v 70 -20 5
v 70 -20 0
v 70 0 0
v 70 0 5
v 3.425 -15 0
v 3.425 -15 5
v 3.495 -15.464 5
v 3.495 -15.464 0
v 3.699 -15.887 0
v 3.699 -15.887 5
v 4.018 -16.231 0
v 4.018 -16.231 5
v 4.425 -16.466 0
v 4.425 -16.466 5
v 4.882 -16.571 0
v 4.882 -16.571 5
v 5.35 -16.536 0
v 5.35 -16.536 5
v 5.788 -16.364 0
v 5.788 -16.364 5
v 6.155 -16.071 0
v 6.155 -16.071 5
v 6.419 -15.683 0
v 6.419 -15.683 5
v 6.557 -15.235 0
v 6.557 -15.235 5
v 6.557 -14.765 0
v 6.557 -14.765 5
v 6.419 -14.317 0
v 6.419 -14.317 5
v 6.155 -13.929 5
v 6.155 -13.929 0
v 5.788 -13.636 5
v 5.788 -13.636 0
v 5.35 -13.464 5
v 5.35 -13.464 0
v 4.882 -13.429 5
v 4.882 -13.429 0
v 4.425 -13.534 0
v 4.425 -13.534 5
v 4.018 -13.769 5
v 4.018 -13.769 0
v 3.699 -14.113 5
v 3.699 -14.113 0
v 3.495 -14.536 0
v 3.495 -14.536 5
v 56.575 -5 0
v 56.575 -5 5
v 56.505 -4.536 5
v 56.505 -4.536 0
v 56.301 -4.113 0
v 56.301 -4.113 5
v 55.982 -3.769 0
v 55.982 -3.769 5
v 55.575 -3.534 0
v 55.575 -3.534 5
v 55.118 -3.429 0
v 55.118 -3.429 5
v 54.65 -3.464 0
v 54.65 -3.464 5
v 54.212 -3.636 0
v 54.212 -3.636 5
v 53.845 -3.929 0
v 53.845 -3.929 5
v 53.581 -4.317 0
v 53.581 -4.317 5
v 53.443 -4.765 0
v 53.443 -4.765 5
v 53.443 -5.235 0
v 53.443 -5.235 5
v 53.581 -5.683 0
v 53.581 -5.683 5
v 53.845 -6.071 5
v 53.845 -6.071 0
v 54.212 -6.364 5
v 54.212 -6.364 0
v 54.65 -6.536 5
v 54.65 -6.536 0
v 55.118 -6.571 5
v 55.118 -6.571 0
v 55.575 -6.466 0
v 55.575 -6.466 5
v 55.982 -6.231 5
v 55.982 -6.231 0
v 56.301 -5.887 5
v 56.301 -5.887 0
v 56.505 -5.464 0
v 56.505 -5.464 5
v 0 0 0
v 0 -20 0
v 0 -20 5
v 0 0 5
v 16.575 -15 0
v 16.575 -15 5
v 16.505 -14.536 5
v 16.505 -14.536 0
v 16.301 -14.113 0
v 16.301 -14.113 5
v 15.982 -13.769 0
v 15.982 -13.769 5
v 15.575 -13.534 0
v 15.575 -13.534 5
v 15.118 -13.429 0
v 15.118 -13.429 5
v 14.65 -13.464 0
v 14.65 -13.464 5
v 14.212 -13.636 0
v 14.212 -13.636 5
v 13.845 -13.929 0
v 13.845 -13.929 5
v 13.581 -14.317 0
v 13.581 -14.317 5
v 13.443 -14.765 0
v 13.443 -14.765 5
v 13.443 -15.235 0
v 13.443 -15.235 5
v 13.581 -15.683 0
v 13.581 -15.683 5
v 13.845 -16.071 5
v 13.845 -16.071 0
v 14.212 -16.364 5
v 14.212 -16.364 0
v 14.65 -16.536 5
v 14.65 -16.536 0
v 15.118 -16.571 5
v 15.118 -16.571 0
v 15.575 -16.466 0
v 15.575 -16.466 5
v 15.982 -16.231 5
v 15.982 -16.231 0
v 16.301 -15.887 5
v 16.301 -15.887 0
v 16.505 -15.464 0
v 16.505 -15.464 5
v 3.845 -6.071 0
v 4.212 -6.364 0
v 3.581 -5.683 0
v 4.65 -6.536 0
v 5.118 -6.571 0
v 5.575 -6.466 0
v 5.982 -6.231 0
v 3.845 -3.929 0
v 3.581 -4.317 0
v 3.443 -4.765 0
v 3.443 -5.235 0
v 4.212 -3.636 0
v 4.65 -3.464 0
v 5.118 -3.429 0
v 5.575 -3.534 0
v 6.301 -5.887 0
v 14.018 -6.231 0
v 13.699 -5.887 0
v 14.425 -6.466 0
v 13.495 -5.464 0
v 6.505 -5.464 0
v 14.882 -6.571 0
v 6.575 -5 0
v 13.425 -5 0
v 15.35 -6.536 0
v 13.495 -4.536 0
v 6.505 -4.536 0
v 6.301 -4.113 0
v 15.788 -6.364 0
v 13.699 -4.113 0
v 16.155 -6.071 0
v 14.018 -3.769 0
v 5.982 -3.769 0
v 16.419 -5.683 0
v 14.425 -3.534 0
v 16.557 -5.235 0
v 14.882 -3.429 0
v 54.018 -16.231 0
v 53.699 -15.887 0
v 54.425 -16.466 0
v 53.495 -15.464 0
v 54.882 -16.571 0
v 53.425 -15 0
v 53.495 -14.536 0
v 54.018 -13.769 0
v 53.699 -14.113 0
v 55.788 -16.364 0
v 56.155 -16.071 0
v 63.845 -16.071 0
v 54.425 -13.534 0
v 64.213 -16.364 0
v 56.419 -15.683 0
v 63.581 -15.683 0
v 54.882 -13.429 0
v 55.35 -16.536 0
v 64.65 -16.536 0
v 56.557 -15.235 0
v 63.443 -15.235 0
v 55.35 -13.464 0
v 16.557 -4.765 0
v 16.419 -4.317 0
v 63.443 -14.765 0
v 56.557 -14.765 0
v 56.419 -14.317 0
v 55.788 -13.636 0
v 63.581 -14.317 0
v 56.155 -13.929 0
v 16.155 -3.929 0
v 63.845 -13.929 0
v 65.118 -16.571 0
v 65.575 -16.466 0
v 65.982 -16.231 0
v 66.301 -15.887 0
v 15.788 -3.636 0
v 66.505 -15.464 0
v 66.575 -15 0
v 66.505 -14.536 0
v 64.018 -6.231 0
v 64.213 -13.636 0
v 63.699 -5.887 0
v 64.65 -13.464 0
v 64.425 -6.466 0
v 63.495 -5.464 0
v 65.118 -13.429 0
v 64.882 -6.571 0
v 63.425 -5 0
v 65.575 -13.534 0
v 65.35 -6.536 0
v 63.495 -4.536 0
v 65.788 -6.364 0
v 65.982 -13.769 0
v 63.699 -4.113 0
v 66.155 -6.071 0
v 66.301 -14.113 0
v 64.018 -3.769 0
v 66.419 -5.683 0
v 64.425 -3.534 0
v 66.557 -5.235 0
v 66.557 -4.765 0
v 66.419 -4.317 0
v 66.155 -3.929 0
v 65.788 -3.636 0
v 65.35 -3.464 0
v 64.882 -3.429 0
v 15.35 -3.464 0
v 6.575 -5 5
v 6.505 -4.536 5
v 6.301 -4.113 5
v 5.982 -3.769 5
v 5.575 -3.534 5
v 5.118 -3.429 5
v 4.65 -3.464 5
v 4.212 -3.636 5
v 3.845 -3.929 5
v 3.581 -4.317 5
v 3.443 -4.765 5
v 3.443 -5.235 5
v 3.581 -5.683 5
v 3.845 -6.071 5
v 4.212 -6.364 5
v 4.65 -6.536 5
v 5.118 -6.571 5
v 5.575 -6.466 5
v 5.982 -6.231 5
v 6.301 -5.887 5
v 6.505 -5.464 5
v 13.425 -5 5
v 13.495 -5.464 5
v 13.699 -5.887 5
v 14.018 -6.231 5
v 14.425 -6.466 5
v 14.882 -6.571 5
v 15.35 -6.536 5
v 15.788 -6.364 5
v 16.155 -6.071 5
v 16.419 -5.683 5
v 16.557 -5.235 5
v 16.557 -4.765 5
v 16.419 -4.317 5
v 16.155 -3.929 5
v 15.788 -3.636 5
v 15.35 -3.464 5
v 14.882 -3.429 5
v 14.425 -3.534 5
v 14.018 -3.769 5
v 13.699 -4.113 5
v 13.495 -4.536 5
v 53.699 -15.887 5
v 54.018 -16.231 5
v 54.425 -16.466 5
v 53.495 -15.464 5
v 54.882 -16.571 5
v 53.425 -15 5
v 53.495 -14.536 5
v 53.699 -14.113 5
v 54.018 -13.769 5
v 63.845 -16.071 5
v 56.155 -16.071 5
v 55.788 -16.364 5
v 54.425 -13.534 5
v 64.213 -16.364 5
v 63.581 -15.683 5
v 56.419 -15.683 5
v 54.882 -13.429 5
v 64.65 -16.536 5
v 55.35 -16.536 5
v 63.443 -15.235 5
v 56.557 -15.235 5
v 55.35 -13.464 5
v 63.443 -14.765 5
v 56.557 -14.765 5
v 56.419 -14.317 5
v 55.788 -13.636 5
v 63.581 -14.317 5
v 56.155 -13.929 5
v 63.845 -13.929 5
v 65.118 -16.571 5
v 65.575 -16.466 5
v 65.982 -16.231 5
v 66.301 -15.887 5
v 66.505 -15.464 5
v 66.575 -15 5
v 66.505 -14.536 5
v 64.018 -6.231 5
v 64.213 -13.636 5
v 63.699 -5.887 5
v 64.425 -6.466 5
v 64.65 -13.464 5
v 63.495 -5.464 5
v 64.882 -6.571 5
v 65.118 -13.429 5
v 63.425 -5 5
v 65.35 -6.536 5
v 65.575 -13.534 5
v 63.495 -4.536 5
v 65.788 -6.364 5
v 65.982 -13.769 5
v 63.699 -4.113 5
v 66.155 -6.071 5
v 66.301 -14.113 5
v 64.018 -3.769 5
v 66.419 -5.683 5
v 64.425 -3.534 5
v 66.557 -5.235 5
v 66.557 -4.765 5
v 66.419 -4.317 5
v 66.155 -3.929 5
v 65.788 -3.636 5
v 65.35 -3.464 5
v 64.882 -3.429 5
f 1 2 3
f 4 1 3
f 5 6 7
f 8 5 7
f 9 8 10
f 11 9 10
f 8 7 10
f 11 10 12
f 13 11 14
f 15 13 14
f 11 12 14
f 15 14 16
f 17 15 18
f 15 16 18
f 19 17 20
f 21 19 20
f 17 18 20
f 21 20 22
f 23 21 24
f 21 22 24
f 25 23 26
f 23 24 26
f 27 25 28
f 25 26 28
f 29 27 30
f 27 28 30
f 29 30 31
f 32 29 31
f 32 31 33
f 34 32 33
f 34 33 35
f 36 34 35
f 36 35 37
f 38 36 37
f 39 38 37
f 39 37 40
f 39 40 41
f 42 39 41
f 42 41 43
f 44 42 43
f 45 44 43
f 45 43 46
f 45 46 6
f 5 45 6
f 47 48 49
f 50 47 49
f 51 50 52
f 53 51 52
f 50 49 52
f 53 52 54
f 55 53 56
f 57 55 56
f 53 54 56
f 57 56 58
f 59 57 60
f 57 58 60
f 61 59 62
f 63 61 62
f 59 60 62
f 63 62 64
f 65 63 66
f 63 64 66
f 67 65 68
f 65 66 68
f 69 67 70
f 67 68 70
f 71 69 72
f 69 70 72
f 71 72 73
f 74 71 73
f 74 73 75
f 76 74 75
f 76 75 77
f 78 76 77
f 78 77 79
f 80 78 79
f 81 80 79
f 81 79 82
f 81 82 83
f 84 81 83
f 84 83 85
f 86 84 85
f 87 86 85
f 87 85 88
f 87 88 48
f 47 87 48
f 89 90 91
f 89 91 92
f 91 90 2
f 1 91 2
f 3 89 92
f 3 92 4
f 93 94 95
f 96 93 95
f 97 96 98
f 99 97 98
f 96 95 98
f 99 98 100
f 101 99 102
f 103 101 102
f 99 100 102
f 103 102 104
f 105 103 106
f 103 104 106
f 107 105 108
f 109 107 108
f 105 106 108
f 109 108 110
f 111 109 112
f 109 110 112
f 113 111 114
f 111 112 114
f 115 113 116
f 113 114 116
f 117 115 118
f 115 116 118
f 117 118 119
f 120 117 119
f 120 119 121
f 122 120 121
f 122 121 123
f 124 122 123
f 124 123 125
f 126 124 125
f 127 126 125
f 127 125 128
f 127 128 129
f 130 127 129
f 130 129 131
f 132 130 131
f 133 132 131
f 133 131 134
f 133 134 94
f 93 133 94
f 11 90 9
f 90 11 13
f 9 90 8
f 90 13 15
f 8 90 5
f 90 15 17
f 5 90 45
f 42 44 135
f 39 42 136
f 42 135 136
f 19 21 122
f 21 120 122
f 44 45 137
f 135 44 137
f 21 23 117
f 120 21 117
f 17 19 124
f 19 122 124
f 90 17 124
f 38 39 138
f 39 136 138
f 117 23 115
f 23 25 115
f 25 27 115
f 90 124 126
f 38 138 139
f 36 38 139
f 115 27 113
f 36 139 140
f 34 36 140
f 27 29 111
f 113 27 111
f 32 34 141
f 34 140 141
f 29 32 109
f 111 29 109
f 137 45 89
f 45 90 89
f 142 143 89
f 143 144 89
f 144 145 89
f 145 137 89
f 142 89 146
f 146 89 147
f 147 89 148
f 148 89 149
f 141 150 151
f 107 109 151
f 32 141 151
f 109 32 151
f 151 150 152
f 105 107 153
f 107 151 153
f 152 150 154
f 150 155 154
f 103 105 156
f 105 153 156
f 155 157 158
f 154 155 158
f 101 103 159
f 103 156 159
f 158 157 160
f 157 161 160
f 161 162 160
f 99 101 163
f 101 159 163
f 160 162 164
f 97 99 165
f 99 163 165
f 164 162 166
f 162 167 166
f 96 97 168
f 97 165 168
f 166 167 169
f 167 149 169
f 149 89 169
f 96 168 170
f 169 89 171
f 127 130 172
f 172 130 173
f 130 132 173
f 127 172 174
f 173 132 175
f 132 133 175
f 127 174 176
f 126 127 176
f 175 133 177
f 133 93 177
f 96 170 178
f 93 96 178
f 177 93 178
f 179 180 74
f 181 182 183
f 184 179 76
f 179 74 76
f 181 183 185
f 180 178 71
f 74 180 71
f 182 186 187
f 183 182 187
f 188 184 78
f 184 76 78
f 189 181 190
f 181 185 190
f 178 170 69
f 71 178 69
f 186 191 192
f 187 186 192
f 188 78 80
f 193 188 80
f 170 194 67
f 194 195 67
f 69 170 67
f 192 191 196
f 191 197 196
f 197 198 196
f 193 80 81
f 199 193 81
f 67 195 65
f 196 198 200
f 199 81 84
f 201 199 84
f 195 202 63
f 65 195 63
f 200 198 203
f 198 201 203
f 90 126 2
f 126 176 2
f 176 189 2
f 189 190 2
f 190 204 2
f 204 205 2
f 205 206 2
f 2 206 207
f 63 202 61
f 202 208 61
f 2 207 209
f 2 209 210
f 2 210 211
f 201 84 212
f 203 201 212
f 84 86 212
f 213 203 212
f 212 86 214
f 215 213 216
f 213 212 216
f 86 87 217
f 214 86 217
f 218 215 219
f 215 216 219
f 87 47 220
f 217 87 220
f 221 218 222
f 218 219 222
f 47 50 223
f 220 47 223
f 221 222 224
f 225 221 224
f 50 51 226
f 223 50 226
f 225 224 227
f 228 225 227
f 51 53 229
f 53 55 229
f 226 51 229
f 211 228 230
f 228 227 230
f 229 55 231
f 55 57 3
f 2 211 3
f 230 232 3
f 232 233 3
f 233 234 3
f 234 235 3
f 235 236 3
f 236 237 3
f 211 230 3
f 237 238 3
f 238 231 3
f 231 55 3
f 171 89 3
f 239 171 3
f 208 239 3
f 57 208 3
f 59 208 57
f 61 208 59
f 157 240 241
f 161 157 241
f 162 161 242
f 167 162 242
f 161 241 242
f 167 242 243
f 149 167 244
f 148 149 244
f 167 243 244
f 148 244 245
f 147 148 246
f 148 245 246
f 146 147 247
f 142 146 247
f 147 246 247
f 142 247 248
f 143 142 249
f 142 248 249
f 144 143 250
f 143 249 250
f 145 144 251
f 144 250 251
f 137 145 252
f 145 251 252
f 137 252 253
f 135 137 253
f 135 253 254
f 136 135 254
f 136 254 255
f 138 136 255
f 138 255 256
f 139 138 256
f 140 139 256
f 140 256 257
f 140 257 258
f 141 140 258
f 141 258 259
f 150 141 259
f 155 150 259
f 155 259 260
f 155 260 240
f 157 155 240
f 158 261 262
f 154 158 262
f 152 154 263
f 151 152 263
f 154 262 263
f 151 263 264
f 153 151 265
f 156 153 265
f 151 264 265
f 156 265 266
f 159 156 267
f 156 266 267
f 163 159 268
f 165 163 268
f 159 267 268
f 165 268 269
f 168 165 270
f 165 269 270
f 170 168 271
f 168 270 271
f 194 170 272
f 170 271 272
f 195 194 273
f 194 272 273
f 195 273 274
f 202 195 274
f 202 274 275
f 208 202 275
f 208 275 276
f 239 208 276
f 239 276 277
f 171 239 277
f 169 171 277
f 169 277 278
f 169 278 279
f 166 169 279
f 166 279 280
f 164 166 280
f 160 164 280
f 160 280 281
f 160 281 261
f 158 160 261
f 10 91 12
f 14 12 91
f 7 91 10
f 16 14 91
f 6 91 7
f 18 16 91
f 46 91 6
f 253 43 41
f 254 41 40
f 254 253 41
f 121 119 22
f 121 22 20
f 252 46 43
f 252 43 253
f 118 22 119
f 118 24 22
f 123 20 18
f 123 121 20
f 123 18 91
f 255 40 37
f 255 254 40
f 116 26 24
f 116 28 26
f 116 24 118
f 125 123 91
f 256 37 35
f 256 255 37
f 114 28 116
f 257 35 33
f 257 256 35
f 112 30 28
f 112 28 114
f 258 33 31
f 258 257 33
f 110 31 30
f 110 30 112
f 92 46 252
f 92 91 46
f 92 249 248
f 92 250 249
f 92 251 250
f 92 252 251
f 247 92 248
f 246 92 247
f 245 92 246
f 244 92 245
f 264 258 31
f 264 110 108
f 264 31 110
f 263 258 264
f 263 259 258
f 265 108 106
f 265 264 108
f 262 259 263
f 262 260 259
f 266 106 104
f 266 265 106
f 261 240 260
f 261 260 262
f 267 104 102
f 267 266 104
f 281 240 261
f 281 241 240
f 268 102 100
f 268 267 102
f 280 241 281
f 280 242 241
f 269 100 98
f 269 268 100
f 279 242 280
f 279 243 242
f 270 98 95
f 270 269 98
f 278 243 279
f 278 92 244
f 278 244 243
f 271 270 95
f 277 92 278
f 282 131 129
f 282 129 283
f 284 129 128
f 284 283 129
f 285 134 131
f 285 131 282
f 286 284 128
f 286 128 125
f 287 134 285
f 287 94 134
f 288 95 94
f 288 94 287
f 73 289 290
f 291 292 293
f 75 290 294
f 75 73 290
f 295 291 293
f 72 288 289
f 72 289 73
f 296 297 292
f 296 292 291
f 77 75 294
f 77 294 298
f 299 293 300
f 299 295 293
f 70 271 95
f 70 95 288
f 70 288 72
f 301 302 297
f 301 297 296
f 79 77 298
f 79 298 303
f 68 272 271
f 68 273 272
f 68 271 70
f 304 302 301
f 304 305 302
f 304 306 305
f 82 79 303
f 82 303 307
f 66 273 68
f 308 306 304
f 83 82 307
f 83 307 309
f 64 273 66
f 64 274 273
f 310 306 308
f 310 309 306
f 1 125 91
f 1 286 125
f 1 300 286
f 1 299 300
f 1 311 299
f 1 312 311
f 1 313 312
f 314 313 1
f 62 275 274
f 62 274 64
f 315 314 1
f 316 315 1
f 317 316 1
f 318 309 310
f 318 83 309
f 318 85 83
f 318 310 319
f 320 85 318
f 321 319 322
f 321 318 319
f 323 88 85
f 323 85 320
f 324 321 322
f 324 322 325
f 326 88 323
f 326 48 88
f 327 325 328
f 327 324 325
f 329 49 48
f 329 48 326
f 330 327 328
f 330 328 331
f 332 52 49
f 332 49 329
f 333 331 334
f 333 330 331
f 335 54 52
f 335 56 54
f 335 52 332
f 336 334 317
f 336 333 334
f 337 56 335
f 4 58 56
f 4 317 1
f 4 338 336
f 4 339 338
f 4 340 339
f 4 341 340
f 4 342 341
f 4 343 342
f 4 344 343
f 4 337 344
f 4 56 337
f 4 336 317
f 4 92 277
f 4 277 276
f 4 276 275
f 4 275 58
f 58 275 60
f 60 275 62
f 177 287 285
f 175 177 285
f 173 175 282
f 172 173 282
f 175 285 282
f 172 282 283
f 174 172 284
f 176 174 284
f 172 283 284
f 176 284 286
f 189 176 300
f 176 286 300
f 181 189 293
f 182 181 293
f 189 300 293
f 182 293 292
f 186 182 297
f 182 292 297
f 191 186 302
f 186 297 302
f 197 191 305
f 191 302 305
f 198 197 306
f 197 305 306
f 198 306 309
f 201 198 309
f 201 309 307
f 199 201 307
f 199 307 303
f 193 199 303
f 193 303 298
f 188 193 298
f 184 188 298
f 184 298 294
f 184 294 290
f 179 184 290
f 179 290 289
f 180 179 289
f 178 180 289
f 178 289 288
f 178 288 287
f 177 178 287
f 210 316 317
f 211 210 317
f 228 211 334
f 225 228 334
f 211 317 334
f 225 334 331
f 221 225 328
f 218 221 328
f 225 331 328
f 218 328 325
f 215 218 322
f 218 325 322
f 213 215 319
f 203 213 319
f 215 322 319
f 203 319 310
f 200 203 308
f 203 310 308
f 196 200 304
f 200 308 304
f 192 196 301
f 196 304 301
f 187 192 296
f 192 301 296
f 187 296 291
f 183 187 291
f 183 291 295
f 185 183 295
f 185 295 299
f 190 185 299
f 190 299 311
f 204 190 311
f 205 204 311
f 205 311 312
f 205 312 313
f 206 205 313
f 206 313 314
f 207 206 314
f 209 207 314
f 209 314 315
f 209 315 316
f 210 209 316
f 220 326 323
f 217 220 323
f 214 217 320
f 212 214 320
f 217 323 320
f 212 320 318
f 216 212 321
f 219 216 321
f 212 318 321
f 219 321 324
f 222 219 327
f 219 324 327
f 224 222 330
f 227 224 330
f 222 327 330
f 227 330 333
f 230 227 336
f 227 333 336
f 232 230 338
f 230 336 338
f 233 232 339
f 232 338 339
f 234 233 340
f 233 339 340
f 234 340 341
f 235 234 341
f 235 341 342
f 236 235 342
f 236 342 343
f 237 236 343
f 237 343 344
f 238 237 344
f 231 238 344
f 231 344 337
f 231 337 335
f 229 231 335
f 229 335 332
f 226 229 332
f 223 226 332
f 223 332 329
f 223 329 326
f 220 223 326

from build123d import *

# Parameters (mm, degrees)
SKETCH_1_W          = 70
SKETCH_1_H          = 20
EXTRUDE_1_DEPTH     = 5
SKETCH_2_R          = 1.575
CUT_EXTRUDE_1_DEPTH = 73.972597597


with BuildPart() as part:
    # 草图1 → 凸台-拉伸1 (new body)
    with BuildSketch(Plane.XY):
        with Locations((35, -10)):
            Rectangle(SKETCH_1_W, SKETCH_1_H)
    extrude(amount=EXTRUDE_1_DEPTH)

    # 草图2 → 切除-拉伸1 (cut, through all)
    with BuildSketch(Plane.XY.offset(5)):
        with Locations((5, -5)):
            Circle(SKETCH_2_R)
        with Locations(Location((5, -15, 0), (0, 0, 180))):
            Circle(SKETCH_2_R)
        with Locations((15, -15)):
            Circle(SKETCH_2_R)
        with Locations(Location((15, -5, 0), (0, 0, 180))):
            Circle(SKETCH_2_R)
        with Locations((55, -5)):
            Circle(SKETCH_2_R)
        with Locations(Location((55, -15, 0), (0, 0, 180))):
            Circle(SKETCH_2_R)
        with Locations((65, -15)):
            Circle(SKETCH_2_R)
        with Locations(Location((65, -5, 0), (0, 0, 180))):
            Circle(SKETCH_2_R)
    extrude(amount=-CUT_EXTRUDE_1_DEPTH, mode=Mode.SUBTRACT)


solid = part.part
